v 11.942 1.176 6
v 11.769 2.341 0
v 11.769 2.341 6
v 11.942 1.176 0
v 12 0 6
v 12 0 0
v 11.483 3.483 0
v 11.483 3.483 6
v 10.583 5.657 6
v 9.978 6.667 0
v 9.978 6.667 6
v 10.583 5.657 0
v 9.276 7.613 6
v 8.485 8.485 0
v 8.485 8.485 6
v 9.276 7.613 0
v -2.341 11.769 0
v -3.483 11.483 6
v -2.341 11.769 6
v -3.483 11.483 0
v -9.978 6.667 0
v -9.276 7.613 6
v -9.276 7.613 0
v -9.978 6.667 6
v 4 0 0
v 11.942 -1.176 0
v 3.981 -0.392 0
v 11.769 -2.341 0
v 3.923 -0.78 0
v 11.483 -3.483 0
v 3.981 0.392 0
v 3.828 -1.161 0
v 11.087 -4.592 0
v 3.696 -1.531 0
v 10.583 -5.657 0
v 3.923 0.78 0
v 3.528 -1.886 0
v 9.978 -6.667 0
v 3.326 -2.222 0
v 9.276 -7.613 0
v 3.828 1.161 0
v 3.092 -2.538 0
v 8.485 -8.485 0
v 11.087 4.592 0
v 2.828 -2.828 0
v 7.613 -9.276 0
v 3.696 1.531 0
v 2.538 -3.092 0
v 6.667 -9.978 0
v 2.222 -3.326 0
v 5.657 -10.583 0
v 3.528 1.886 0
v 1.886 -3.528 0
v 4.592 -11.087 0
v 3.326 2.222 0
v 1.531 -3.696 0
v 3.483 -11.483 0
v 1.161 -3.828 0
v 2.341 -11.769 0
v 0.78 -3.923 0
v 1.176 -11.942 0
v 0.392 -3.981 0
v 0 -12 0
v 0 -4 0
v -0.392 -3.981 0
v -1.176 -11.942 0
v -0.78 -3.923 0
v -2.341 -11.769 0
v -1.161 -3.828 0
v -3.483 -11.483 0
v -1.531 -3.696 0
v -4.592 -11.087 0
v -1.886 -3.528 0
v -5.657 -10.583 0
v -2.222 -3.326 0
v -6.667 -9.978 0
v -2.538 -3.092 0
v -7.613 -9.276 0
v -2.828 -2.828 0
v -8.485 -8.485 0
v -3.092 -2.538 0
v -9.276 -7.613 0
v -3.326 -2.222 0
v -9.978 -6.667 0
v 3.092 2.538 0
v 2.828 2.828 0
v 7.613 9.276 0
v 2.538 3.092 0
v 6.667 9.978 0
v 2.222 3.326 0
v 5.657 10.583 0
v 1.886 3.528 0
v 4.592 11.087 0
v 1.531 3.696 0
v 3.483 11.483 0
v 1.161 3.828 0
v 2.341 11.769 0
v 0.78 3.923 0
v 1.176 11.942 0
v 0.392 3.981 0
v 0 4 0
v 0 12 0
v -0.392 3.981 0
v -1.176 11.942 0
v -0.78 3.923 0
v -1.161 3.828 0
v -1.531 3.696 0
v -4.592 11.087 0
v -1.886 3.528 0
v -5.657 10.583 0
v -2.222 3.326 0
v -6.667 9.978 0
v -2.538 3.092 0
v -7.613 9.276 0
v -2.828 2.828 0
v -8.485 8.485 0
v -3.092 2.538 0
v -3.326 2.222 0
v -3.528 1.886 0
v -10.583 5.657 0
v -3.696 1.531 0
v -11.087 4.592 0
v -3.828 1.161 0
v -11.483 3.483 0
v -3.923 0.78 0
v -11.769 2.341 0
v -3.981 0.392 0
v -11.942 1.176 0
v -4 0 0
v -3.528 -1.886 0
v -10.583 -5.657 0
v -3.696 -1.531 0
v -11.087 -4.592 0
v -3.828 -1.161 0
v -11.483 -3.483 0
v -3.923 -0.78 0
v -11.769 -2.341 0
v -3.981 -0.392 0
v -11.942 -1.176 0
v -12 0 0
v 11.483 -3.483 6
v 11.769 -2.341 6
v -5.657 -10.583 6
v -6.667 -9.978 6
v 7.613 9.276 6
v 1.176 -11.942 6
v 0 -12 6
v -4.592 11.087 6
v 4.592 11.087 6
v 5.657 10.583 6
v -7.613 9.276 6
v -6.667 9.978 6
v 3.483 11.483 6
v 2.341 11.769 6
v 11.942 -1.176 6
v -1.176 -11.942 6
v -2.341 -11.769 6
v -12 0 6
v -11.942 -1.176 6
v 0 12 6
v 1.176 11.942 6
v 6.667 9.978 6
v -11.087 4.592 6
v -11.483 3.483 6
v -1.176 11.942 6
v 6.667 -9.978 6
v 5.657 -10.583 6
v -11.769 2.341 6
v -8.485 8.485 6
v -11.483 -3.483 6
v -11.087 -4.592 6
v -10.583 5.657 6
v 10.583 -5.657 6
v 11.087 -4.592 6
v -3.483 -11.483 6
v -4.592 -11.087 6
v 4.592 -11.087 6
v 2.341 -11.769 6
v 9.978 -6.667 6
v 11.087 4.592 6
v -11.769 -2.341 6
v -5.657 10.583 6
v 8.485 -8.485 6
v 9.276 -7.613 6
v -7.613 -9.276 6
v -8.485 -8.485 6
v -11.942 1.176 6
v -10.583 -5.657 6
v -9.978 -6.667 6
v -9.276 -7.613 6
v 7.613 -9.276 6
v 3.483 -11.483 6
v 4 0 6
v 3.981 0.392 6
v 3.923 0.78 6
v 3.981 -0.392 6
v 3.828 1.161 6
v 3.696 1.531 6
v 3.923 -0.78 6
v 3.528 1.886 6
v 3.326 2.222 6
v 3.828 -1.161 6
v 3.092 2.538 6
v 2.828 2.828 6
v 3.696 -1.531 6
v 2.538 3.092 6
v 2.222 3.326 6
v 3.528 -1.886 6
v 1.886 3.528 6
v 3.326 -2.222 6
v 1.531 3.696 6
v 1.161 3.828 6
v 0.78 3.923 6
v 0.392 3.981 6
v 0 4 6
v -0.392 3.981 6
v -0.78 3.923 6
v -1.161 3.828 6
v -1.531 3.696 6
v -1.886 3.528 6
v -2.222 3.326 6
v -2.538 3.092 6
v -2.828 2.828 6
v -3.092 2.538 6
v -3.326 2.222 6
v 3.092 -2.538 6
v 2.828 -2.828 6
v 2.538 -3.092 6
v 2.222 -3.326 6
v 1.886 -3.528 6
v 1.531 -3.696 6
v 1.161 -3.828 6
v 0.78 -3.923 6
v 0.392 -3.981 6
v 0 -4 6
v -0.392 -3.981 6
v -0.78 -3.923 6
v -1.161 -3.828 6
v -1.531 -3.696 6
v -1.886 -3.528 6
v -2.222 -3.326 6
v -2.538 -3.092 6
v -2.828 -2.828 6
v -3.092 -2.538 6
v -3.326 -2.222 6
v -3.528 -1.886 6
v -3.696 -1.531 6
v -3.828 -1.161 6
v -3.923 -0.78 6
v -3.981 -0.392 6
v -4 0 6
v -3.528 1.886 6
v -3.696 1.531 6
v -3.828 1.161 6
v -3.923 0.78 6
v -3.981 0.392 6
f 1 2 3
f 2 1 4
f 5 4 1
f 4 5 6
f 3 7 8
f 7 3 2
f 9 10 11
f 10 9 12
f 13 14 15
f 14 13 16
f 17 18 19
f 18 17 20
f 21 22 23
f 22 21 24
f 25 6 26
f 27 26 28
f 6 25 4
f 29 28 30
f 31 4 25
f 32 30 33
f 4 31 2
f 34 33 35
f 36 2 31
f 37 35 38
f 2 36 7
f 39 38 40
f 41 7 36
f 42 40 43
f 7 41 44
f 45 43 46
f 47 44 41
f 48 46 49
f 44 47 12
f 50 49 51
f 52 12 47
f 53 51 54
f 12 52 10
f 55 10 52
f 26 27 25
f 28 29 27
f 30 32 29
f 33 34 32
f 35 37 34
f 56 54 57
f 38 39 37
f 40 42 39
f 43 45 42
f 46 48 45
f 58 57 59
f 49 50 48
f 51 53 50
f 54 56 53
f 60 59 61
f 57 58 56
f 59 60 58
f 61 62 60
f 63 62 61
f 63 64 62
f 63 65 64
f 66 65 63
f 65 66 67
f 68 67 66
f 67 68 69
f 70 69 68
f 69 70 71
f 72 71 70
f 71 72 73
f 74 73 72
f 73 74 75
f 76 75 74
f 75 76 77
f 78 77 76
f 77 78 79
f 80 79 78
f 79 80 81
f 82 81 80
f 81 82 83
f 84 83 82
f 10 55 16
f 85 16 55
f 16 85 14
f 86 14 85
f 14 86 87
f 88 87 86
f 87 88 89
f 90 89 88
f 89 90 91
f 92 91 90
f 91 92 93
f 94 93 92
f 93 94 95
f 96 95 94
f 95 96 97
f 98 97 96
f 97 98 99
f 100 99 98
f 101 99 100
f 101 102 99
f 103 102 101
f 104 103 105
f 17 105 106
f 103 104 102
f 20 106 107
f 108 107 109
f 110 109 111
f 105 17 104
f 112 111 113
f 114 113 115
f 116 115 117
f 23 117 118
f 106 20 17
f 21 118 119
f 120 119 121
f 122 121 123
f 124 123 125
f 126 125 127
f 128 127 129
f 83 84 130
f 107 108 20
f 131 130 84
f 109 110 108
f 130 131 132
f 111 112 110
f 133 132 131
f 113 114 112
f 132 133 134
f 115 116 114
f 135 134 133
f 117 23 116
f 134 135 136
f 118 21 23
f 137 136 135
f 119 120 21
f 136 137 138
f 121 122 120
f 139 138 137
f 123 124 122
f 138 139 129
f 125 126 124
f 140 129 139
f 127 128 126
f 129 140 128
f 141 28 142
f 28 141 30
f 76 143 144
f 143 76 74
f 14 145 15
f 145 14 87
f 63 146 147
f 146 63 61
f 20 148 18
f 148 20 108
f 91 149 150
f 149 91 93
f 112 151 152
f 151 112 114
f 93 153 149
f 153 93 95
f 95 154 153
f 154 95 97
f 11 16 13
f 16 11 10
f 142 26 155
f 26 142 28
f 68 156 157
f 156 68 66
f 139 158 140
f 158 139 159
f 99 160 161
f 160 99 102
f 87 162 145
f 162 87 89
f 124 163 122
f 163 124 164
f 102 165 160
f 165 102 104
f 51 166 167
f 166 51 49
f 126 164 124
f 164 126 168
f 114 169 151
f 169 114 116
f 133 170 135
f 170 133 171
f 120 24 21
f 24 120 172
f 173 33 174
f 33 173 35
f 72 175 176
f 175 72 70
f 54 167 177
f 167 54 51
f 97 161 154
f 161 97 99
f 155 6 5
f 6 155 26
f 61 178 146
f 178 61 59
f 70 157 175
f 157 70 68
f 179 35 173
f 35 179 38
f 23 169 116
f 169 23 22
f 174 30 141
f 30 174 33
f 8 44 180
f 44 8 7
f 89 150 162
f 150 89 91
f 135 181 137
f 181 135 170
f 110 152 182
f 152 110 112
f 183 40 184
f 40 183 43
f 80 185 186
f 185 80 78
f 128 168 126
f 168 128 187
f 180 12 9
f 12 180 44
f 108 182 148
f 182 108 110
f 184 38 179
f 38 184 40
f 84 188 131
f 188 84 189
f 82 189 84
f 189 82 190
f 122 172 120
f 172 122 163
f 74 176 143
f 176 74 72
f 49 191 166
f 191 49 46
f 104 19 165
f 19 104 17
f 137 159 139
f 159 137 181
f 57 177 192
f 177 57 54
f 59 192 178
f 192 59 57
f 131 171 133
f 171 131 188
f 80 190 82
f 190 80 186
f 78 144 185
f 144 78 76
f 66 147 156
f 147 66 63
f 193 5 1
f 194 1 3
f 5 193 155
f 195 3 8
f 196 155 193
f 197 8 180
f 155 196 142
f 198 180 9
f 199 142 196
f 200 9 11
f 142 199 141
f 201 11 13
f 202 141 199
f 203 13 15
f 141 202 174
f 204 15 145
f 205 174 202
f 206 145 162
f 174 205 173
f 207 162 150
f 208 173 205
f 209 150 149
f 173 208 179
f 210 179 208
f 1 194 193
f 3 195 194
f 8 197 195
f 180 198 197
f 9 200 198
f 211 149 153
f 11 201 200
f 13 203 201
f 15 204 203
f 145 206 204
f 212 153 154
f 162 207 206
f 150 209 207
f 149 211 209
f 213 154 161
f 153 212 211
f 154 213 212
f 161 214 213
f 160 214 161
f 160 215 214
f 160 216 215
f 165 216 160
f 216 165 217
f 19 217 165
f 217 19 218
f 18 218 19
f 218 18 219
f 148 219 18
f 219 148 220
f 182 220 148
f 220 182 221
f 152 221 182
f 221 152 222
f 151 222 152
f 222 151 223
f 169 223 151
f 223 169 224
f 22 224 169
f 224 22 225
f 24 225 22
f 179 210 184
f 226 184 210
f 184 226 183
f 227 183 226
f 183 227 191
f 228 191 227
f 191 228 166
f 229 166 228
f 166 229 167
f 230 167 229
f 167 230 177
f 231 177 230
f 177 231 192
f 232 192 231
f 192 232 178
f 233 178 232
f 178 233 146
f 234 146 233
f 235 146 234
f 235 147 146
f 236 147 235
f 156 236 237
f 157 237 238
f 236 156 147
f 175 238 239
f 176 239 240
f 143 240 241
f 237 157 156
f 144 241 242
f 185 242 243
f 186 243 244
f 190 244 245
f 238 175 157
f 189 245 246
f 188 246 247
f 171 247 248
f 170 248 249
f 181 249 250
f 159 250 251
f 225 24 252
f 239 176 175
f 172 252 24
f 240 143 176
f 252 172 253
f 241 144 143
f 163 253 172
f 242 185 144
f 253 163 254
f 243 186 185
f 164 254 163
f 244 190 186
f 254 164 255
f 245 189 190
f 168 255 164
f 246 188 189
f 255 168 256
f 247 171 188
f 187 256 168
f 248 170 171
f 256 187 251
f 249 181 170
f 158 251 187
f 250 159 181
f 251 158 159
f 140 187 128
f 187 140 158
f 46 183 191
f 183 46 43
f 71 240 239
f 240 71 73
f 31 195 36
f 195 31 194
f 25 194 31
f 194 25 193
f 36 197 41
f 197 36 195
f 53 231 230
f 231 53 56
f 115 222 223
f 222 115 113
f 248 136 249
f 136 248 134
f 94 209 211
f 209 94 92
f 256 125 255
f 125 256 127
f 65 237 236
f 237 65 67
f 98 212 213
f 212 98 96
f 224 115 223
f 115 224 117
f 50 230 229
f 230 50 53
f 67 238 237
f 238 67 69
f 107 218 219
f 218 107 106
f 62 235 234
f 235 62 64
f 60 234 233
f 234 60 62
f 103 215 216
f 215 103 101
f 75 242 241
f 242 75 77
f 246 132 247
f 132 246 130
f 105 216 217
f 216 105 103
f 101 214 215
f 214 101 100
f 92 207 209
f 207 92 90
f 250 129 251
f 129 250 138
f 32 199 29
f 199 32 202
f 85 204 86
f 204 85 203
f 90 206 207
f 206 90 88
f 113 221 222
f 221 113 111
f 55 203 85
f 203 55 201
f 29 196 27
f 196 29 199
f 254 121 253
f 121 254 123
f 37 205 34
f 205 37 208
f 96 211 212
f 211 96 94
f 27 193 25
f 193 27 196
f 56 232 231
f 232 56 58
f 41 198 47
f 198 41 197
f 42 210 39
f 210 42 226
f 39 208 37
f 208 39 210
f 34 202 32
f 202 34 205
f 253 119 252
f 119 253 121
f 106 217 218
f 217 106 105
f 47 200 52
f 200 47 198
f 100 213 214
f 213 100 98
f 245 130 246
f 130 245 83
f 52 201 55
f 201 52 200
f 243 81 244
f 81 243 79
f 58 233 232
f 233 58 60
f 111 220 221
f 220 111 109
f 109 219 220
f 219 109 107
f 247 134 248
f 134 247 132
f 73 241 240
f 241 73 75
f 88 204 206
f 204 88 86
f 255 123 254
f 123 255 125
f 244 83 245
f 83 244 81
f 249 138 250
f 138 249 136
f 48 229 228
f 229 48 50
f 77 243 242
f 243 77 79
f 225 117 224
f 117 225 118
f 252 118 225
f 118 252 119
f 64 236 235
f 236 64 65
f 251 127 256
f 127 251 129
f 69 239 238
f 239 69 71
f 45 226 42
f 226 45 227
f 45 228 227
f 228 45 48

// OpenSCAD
// Hand-written verification example, not AI-generated. All dimensions are mm.
outer_diameter = 24;
inner_diameter = 8;
height = 6;
$fn = 64;
assert(outer_diameter > inner_diameter && inner_diameter > 0 && height > 0);
difference() {
    cylinder(d = outer_diameter, h = height);
    translate([0, 0, -0.1]) cylinder(d = inner_diameter, h = height + 0.2);
}
